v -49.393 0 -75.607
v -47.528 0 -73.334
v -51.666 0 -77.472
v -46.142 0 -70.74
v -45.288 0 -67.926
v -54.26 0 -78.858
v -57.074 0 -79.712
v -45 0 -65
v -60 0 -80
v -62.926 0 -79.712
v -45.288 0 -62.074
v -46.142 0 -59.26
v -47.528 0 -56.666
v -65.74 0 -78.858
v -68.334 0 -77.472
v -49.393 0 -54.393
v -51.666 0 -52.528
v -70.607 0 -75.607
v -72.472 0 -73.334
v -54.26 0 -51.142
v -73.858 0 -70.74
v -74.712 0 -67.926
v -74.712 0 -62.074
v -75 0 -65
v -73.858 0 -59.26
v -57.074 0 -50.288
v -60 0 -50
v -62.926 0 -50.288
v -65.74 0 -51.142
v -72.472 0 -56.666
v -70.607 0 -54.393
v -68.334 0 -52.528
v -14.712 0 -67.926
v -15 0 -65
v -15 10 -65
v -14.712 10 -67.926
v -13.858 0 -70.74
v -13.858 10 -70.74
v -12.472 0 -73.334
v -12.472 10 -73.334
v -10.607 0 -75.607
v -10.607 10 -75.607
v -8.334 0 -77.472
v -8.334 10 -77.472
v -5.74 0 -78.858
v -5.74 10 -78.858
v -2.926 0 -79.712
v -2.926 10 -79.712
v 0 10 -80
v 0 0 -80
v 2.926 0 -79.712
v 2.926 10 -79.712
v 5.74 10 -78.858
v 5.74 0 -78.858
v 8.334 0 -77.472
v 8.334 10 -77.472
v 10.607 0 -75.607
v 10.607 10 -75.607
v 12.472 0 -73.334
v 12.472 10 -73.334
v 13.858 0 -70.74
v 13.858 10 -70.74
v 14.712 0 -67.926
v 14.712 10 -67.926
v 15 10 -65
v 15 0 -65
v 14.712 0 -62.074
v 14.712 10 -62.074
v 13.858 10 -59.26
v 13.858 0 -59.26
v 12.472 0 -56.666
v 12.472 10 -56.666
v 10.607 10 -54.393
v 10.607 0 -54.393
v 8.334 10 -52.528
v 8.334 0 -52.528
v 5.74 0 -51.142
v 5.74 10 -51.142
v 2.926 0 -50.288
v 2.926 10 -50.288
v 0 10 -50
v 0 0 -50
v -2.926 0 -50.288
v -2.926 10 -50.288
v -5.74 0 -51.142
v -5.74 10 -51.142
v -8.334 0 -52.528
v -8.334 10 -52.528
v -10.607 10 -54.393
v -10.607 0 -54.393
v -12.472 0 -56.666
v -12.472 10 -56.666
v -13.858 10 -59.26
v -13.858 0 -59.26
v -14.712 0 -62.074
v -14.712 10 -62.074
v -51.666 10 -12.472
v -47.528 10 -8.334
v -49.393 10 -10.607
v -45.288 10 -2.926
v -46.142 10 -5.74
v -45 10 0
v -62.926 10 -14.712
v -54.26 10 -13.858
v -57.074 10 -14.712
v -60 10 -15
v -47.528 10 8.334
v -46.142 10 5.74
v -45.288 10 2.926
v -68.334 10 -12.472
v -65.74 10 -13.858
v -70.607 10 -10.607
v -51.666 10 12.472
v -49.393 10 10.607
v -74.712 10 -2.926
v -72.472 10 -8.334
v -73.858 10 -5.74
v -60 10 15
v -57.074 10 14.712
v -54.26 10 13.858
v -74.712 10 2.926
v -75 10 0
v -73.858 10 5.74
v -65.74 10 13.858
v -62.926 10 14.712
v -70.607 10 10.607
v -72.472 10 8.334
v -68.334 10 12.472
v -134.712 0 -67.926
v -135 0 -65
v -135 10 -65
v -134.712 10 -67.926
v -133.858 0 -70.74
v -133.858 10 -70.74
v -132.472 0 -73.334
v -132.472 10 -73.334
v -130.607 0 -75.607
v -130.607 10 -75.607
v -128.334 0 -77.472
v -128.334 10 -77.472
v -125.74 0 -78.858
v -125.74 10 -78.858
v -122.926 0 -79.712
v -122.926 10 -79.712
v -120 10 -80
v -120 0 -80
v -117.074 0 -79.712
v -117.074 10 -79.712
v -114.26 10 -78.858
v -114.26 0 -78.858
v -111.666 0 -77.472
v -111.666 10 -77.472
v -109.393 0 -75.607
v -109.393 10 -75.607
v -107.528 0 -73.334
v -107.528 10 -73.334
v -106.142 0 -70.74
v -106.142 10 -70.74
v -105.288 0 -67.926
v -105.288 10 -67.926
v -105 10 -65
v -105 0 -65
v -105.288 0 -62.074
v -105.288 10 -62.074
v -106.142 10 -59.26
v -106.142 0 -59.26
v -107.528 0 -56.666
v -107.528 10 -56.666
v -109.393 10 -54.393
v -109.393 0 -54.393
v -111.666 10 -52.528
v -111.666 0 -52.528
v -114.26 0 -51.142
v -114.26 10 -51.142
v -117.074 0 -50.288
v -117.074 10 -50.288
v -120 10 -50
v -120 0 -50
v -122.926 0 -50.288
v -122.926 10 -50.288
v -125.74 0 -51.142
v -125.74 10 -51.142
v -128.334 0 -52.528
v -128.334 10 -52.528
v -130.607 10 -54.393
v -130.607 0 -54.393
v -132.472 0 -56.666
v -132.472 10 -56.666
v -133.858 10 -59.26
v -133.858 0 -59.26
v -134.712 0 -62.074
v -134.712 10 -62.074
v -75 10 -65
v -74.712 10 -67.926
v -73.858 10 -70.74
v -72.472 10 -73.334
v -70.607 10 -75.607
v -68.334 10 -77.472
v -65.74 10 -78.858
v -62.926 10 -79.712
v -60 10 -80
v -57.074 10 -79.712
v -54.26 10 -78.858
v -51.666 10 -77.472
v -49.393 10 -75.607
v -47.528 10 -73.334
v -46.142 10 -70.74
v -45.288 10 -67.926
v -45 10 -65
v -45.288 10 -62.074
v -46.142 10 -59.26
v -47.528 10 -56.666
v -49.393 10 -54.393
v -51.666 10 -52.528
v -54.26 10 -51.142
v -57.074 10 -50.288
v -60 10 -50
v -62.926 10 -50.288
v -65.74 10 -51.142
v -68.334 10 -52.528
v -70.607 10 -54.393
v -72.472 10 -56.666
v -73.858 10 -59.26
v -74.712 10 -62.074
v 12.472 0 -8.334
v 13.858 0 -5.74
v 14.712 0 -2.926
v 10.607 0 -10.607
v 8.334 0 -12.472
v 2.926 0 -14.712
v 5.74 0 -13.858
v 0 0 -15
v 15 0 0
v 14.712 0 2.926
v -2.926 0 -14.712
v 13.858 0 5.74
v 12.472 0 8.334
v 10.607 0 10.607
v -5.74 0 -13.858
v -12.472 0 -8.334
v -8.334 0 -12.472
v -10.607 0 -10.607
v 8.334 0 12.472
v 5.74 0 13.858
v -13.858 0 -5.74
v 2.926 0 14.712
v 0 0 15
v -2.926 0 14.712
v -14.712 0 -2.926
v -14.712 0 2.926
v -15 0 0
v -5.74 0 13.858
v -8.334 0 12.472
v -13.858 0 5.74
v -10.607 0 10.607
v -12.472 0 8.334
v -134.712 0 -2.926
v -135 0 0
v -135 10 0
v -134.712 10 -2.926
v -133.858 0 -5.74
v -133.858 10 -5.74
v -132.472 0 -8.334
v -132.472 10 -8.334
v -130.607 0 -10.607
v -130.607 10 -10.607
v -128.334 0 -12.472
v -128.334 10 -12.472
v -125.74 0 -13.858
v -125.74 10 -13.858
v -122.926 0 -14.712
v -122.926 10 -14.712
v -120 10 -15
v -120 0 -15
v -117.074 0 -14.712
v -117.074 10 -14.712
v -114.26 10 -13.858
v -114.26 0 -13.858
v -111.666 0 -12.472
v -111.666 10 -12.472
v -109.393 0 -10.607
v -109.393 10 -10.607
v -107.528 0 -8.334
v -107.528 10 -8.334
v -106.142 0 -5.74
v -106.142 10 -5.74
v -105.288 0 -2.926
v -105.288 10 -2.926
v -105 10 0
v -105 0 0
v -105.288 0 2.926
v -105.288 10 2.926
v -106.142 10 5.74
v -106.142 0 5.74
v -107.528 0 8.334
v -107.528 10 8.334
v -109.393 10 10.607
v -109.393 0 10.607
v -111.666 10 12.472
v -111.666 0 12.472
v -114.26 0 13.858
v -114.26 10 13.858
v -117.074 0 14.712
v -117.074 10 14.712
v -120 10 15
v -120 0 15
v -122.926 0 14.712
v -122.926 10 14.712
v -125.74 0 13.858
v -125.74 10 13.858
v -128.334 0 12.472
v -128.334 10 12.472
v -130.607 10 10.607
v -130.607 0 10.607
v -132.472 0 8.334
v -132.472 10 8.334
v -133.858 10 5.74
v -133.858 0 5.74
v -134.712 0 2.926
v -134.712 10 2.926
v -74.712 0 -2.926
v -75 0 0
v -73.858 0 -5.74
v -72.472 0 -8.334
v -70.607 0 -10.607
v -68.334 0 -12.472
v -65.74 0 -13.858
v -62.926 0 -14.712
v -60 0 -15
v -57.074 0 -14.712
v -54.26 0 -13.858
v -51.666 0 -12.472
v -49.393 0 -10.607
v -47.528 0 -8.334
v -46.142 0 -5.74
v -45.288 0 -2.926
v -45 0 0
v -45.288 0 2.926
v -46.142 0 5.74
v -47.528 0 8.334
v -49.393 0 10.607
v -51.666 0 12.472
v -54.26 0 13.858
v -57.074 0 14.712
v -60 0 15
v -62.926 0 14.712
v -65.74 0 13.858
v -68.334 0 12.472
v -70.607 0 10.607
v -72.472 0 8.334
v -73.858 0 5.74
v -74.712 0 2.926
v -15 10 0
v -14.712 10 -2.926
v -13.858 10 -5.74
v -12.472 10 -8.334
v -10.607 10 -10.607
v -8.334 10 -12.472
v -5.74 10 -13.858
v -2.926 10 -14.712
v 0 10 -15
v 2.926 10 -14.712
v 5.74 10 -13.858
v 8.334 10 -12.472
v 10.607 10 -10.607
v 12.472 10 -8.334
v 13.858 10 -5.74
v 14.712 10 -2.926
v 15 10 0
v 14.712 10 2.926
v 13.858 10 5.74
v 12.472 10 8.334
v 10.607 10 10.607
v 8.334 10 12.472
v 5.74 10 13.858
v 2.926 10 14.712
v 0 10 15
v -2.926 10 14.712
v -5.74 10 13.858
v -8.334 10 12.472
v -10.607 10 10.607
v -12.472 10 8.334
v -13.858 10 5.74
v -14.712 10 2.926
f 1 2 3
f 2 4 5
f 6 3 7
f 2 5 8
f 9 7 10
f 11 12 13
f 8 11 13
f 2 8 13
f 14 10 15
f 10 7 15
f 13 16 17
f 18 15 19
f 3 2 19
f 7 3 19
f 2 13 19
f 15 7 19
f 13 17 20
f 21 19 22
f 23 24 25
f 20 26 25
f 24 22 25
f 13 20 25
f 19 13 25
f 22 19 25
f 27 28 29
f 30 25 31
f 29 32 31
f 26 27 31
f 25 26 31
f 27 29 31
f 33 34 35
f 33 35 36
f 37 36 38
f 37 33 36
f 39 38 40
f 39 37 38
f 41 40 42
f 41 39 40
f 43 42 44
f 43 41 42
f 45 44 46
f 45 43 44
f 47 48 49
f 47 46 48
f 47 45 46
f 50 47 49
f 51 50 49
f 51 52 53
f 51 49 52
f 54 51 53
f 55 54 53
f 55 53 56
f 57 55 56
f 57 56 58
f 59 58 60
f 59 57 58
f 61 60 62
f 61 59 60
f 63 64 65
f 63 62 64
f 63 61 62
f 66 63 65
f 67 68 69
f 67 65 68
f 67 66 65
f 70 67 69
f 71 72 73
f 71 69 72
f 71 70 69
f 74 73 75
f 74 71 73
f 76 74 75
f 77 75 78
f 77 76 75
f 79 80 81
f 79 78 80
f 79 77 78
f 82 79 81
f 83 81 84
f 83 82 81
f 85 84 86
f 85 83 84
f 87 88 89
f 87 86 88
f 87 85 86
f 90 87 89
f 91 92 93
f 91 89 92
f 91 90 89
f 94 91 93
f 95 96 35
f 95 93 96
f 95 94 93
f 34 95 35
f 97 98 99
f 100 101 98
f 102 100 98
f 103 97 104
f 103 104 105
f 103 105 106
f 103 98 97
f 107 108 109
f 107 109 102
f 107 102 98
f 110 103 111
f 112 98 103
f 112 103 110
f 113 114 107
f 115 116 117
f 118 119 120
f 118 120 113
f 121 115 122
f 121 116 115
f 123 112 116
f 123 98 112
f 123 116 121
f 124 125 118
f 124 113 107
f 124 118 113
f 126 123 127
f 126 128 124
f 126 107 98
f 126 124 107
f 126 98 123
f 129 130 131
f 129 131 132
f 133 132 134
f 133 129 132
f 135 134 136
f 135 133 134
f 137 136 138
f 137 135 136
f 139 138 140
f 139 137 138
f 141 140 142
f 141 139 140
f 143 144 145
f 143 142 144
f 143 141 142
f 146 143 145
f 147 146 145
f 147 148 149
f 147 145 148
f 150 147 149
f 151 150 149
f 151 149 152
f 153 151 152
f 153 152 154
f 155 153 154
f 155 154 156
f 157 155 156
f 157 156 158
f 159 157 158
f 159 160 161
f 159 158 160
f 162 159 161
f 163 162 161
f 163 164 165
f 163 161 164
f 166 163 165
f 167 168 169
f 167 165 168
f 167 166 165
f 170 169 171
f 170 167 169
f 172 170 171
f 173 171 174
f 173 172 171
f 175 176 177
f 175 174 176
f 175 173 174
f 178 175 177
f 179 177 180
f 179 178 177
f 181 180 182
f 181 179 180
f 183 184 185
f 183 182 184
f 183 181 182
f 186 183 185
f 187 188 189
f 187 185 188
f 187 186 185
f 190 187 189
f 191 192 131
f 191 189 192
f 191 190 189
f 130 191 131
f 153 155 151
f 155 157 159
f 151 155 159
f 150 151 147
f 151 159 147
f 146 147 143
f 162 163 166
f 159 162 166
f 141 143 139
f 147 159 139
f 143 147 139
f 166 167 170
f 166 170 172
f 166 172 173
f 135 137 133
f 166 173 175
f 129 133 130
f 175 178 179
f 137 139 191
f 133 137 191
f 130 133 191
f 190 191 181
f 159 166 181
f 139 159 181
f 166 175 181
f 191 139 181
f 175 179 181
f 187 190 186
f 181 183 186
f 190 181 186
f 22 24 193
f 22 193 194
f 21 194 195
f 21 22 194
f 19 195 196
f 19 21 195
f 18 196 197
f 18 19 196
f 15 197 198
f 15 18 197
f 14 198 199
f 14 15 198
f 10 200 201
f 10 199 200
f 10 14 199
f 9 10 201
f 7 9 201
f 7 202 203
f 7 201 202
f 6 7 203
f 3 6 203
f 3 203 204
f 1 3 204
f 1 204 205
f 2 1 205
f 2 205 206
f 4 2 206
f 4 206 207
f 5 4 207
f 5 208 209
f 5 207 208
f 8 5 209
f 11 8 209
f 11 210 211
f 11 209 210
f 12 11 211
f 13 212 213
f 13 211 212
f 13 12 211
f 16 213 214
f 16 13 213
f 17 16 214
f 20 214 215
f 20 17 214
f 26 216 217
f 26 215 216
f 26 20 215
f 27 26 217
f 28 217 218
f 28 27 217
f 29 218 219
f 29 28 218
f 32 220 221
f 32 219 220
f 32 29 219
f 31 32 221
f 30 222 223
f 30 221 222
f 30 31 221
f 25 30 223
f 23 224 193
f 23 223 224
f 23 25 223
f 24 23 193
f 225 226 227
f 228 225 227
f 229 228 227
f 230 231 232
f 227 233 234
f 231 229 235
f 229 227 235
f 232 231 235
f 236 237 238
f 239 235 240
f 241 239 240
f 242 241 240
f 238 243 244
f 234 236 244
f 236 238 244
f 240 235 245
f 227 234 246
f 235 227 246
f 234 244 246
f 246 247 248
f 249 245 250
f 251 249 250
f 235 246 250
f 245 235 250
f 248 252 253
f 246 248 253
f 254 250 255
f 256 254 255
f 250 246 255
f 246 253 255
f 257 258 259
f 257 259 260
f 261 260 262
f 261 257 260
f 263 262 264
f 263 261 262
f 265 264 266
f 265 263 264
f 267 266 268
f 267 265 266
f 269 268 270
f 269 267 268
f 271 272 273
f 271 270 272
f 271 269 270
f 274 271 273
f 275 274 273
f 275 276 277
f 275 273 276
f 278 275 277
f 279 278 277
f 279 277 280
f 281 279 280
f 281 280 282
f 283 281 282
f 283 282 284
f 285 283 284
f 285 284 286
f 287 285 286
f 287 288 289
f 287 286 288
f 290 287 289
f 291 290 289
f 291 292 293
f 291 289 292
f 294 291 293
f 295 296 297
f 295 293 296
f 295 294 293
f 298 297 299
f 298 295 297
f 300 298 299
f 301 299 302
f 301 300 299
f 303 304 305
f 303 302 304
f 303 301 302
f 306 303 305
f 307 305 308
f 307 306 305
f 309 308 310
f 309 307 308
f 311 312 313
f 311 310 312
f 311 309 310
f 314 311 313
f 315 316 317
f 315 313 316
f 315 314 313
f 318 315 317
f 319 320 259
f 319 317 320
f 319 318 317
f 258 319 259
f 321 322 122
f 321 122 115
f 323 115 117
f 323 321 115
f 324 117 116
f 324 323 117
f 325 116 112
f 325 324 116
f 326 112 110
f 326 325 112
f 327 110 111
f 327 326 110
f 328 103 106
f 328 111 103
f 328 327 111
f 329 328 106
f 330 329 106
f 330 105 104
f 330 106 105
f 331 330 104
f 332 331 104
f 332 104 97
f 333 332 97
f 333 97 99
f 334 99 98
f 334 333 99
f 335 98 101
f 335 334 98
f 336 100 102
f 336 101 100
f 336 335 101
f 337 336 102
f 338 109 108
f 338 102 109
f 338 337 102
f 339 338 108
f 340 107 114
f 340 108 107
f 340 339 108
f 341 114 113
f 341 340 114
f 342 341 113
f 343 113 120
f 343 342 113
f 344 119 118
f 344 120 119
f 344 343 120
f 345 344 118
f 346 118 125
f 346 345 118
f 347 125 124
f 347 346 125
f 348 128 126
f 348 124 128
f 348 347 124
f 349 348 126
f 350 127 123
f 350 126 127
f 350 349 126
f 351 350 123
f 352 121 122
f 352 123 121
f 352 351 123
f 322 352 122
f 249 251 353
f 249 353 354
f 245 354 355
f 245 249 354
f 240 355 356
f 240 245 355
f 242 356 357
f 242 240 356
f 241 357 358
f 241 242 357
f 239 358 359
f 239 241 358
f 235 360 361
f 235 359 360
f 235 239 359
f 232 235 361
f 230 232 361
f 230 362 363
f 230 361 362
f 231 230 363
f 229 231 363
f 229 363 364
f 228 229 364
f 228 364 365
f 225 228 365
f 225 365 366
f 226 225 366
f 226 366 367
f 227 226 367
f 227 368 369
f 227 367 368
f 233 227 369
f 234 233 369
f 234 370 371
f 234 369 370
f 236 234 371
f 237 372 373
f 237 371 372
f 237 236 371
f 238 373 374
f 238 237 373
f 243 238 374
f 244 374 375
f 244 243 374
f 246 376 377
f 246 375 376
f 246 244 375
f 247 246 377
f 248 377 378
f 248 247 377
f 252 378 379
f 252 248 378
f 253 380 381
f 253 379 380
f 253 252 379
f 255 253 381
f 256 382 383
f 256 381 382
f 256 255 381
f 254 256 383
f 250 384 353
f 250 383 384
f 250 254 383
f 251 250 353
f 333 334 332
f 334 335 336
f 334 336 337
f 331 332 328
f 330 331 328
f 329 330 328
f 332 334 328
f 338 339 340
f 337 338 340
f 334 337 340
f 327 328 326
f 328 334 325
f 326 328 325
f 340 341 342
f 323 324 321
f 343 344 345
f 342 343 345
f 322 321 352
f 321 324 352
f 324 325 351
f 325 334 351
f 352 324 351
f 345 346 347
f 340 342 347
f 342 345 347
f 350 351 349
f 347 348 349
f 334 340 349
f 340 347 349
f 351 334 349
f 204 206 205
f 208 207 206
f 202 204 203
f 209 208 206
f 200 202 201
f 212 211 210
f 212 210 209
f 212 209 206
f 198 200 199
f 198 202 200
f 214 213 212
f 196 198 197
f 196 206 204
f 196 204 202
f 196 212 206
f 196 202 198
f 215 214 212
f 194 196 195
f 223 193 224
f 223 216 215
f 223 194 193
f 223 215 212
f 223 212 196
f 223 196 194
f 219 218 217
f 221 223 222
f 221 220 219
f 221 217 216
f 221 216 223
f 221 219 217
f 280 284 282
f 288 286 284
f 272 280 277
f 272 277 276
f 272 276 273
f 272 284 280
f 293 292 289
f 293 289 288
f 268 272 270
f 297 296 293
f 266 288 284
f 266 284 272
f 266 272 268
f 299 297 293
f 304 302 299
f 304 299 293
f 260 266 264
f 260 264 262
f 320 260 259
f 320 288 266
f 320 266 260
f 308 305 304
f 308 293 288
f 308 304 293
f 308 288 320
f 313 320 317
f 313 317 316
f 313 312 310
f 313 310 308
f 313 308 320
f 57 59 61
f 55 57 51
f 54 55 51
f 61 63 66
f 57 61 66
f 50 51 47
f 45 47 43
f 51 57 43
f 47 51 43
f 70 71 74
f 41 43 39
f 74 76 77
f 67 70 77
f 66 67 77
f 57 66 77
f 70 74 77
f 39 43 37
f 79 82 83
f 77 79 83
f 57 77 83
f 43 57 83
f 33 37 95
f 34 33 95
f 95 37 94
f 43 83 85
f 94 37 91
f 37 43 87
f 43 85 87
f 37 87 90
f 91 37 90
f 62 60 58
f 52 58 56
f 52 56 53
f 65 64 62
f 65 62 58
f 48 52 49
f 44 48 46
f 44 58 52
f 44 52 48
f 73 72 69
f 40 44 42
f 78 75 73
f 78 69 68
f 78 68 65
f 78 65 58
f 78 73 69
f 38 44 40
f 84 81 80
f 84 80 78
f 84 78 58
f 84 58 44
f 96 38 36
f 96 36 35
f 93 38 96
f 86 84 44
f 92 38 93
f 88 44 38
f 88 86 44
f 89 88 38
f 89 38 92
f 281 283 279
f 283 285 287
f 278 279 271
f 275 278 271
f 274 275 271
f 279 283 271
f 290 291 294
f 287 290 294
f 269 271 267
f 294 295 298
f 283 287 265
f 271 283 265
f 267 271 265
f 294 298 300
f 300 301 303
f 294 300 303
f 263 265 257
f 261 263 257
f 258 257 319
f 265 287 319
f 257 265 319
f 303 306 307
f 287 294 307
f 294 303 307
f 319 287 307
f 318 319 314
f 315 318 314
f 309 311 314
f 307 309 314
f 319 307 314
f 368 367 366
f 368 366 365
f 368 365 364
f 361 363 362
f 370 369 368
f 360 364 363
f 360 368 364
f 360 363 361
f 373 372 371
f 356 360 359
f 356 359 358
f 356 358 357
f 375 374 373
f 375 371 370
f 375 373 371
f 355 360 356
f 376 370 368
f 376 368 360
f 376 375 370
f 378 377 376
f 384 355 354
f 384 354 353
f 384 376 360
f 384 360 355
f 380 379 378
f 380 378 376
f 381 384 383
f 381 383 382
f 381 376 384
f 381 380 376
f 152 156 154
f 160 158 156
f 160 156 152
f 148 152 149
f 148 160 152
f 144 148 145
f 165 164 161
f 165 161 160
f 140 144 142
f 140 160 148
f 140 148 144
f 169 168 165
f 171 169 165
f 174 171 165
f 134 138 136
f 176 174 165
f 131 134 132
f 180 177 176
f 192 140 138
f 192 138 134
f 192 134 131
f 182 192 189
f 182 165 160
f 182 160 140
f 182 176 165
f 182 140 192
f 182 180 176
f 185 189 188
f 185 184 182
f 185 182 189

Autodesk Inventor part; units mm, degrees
ref_plane "YZ Plane" through (0, 0, 0) normal (1, 0, 0) x (0, 1, 0)
ref_plane "XZ Plane" through (0, 0, 0) normal (0, 1, 0) x (-1, 0, 0)
ref_plane "XY Plane" through (0, 0, 0) normal (0, 0, 1) x (1, 0, 0)
sketch "Sketch1" plane through (0, 0, 0) normal (0, 1, 0) x (-1, 0, 0)
  circle A0 centre (0, 0) radius 15
  line L0 (0, 0) -> (47.0979, 0) construction
  circle A1 centre (60, 0) radius 15
  circle A2 centre (120, 0) radius 15
  line L1 (0, 0) -> (0, -192.965) construction
  circle A3 centre (0, -65) radius 15
  line L2 (0, -65) -> (47.0979, -65) construction
  circle A4 centre (60, -65) radius 15
  circle A5 centre (120, -65) radius 15
  dimension "d0" = 30
  dimension "d6" = 60
  dimension "d13" = 65
extrude "Extrusion1" add sketch "Sketch1" along normal blind 10
properties part number "bt"
